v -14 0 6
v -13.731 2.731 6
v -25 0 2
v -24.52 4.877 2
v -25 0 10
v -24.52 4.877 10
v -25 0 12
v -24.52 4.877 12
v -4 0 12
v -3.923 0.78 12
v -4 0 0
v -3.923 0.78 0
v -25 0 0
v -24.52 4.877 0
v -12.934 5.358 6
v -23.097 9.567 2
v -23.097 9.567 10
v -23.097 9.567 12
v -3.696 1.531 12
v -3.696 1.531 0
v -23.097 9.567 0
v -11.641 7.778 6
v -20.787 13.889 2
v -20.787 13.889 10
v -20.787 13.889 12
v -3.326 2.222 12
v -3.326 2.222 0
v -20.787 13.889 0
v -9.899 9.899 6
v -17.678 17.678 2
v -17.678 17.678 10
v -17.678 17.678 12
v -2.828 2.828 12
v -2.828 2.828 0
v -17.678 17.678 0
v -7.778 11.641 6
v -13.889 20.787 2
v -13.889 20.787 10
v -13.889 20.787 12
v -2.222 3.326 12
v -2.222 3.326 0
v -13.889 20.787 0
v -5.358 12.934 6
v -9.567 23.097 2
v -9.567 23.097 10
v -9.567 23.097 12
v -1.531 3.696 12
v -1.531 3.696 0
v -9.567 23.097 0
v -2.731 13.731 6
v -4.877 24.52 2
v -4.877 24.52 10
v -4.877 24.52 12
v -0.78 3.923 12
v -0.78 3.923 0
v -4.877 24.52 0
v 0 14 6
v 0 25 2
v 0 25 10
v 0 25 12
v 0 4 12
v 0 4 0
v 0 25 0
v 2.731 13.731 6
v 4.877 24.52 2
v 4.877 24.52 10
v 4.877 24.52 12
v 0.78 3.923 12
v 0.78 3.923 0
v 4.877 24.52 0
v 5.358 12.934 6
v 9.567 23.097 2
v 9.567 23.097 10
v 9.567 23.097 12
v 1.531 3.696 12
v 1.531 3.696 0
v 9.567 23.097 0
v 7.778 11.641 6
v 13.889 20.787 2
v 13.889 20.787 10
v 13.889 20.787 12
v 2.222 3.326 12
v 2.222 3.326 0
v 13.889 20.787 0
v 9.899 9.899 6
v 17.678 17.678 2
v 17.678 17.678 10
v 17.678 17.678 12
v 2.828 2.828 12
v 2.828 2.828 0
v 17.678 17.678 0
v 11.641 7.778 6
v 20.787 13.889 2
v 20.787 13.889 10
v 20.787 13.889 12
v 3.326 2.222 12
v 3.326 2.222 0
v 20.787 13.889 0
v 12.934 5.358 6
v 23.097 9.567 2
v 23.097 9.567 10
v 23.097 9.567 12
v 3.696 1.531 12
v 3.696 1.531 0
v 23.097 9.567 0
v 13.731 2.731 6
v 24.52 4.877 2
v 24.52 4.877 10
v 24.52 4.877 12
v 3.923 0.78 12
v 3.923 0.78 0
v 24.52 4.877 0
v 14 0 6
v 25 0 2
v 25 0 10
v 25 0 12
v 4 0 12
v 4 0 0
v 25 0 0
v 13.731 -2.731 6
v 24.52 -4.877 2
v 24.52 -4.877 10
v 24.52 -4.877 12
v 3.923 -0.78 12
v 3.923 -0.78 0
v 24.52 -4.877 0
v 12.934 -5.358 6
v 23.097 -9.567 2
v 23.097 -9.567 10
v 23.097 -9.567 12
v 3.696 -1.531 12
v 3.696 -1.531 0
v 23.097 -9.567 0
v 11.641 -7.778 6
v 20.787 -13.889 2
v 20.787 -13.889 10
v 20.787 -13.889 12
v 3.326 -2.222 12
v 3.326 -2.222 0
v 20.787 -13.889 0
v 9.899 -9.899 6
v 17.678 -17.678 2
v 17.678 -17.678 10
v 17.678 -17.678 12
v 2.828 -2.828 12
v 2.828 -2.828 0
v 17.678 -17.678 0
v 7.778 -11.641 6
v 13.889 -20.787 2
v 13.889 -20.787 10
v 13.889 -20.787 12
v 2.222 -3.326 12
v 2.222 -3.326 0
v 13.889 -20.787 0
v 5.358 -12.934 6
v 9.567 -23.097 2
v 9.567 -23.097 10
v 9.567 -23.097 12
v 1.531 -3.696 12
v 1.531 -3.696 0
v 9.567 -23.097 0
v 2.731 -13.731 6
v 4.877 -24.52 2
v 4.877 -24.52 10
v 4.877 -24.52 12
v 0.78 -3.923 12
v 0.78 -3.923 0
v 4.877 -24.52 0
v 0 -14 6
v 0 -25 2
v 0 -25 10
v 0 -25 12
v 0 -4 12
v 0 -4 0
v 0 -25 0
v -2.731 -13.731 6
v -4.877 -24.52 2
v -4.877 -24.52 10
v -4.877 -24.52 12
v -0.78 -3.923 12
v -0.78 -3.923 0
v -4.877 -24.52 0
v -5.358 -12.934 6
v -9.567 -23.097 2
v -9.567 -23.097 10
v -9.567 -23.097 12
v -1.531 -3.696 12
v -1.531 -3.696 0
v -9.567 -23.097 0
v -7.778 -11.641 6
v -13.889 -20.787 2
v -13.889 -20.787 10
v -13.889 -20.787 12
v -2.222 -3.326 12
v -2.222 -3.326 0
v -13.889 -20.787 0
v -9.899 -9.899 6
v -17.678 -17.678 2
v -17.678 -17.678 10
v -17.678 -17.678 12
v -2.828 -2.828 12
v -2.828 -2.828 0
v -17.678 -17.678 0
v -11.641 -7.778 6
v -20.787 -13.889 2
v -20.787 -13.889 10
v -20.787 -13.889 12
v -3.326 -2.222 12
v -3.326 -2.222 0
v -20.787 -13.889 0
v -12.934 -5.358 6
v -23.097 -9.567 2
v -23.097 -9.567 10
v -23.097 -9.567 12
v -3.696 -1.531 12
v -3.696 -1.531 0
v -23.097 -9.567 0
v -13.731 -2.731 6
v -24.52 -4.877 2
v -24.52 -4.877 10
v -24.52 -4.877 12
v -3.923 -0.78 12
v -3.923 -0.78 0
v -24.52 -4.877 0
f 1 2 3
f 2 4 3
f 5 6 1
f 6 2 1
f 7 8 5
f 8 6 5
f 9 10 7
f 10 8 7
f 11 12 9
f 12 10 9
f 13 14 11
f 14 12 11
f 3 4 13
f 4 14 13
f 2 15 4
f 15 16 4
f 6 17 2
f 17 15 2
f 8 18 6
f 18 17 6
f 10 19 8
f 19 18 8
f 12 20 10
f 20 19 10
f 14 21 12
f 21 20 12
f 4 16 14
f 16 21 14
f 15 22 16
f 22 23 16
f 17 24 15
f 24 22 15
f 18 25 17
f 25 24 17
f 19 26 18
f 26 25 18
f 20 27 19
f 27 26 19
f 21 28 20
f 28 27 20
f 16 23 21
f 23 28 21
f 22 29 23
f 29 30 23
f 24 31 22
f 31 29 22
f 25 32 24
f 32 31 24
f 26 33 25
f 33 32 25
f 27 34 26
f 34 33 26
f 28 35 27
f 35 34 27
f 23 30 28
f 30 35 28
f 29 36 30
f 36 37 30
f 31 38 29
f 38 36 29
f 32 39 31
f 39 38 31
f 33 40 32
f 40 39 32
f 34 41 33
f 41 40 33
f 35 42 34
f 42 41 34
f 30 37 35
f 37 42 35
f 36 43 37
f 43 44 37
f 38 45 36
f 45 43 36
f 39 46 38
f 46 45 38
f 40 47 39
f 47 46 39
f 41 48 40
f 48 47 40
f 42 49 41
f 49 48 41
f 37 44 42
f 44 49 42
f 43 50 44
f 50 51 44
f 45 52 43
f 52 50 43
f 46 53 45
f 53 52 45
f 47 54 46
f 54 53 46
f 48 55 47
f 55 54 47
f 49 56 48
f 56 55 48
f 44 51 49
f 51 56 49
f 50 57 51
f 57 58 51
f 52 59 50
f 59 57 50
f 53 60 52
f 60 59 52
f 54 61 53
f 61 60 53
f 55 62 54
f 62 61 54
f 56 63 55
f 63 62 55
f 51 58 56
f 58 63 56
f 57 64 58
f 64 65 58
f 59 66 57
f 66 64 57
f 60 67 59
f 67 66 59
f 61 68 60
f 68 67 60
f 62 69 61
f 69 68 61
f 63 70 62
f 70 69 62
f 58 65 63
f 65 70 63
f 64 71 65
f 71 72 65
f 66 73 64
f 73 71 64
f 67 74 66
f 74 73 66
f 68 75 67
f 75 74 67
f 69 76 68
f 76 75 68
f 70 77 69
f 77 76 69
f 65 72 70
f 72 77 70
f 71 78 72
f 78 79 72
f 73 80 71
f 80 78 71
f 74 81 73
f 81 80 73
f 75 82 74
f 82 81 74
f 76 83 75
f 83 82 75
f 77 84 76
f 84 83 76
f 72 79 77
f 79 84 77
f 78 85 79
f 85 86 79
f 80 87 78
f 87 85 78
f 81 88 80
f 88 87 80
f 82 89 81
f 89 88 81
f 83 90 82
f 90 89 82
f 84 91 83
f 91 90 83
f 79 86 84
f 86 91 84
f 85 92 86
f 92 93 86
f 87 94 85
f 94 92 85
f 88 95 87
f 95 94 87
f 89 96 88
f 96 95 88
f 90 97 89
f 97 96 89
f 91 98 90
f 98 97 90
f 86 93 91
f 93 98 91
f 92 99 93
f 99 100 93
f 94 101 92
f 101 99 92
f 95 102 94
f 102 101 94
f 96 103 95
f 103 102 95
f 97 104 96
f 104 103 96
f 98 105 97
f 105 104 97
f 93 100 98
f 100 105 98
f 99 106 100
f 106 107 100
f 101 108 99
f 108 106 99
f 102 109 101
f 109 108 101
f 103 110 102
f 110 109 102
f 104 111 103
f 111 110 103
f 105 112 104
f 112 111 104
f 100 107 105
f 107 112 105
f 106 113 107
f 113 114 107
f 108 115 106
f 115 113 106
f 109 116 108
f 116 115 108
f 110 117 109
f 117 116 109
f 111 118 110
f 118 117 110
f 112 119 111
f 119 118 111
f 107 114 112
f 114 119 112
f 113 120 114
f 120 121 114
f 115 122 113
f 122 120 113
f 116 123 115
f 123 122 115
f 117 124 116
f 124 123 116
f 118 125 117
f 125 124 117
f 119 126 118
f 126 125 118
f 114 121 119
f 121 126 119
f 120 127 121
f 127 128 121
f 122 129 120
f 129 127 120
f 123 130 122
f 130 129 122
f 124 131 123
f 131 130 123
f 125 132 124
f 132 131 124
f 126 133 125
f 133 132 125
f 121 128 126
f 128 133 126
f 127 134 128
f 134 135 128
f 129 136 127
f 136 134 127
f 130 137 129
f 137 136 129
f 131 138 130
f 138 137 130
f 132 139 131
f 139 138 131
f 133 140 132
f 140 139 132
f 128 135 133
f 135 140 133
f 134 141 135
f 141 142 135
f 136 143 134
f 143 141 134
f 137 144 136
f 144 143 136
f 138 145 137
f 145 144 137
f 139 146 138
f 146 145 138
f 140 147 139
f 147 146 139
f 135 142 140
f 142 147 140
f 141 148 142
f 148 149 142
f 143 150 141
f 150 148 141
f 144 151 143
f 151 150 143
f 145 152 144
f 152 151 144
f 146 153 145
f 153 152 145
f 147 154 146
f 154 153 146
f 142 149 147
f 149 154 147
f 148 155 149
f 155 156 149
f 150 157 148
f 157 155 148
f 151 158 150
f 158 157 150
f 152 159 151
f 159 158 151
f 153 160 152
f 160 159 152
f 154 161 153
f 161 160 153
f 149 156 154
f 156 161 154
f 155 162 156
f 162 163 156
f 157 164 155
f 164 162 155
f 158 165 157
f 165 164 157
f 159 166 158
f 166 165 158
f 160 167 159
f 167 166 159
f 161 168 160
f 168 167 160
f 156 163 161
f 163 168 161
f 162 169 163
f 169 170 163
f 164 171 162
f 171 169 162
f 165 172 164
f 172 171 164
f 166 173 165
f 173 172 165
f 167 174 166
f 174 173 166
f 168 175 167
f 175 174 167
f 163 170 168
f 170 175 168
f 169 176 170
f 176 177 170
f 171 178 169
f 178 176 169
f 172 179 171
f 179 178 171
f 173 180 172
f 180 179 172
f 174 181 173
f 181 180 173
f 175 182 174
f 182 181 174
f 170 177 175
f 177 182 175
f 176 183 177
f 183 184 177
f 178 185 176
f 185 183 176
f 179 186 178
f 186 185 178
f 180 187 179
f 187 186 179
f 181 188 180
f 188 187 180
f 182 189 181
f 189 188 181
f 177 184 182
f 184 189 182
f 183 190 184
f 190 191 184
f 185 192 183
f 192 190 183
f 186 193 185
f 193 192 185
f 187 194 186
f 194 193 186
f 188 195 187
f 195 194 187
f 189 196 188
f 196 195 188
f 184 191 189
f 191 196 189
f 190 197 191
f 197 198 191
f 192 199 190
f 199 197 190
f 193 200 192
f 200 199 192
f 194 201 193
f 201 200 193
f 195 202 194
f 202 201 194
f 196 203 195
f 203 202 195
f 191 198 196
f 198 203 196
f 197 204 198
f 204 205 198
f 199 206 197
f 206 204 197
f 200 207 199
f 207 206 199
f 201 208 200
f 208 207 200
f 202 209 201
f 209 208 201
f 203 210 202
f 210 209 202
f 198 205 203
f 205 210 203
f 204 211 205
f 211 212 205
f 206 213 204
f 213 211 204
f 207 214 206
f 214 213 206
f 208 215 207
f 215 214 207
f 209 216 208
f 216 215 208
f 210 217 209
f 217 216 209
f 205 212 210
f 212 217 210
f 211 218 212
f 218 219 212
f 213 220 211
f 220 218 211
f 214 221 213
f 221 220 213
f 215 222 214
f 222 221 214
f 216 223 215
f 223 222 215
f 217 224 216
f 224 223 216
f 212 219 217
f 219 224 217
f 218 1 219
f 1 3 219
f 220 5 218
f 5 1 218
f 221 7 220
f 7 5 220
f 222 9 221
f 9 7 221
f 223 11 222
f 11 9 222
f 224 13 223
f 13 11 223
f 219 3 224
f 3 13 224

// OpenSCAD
$fn = 32;

// ----------------------------------------------------------------------
// Revolved part: V-groove pulley R25
// ----------------------------------------------------------------------

// --- parameters (mm) ---
bore_r = 4;               // bore radius
rim_r = 25;               // rim radius
rim_t = 12;               // rim width
groove_r = 14;            // groove root radius
groove_w = 4;             // groove half width
revolve_angle = 360;      // revolve sweep, degrees

bore_d = 2 * bore_r;
rim_d = 2 * rim_r;
groove_d = 2 * groove_r;

profile = [[4, 0], [25, 0], [25, 2], [14, 6], [25, 10], [25, 12], [4, 12]];  // primary outline, 7 points, counter clockwise

// --- the one profile operation ---
rotate_extrude(angle = revolve_angle) polygon(points = profile);
